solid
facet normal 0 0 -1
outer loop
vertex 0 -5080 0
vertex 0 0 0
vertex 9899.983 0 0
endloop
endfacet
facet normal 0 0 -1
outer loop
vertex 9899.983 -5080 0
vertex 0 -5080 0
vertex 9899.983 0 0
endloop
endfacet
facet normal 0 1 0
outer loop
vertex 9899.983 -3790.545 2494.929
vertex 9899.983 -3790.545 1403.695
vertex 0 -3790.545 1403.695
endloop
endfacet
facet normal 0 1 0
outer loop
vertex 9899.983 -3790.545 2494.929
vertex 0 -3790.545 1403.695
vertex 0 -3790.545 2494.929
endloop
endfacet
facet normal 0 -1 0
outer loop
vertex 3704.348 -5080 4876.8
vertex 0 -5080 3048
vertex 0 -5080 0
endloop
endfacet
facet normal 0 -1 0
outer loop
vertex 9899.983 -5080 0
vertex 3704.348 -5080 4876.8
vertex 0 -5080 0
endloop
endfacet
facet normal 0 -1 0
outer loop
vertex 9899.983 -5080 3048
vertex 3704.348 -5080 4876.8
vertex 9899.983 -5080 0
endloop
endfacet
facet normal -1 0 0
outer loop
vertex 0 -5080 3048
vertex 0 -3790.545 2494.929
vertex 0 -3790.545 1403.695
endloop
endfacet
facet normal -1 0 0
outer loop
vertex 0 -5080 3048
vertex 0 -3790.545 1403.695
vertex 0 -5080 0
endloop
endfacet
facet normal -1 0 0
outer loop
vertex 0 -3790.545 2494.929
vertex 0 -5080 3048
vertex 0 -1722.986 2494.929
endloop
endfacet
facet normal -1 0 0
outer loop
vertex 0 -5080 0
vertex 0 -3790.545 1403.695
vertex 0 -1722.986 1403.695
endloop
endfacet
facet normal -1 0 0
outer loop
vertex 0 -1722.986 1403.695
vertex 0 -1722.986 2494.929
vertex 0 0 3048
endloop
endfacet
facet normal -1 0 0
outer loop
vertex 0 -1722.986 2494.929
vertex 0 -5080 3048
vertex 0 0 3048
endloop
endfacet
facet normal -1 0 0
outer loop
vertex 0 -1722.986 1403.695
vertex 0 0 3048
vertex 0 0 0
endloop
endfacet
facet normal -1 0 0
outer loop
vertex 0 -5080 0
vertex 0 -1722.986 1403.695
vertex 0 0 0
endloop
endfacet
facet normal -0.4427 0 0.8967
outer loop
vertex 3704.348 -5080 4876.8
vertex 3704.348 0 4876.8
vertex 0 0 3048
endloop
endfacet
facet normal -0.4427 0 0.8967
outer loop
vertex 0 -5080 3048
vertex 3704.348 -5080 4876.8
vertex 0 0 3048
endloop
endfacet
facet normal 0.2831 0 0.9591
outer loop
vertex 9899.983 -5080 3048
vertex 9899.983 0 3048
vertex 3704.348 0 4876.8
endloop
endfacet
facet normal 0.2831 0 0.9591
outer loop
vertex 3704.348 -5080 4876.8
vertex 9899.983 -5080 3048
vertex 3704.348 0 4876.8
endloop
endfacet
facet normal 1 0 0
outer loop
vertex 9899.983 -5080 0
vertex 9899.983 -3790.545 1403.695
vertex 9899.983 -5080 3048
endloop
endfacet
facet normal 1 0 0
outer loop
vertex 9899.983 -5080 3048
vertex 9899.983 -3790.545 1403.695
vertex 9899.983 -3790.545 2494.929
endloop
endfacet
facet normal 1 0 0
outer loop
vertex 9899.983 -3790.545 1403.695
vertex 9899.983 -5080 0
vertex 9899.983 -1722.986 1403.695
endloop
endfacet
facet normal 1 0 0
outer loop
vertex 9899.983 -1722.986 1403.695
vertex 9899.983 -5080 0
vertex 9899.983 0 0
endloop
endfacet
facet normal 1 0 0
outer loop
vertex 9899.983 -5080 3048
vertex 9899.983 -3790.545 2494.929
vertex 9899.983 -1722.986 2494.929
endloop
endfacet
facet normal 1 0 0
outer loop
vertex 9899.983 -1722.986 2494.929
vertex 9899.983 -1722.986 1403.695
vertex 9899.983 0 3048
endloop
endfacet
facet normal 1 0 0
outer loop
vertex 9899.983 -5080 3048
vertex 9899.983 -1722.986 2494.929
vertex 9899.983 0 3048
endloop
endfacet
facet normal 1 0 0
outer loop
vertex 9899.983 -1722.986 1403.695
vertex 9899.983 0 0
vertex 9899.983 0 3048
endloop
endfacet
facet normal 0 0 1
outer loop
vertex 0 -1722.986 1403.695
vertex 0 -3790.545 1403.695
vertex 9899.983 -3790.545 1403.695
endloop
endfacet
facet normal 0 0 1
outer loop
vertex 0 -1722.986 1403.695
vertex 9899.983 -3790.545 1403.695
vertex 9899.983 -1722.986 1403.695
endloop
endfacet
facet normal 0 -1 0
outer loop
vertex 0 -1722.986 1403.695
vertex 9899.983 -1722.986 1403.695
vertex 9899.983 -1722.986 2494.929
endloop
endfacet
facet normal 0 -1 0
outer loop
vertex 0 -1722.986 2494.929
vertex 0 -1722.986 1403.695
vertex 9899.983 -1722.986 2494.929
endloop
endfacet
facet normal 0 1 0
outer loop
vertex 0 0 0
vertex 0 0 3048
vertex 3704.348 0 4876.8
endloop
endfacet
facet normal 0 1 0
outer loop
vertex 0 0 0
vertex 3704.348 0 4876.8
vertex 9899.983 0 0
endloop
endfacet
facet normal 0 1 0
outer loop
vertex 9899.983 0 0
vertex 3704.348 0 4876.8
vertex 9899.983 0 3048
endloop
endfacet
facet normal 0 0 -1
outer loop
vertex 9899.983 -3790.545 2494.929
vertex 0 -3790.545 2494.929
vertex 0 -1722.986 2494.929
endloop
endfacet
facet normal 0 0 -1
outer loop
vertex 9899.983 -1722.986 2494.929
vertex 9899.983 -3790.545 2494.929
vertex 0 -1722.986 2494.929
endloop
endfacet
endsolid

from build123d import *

# Parameters (mm, degrees)
F1_DEPTH = 5080
F2_W     = 2067.558765
F2_H     = 1091.233373
F3_DEPTH = 9899.983518


with BuildPart() as f1:
    # F0 (on Front) → F1 (new body)
    with BuildSketch(Plane.XZ):
        Polygon((0, 3048), (0, 0), (3670.44008, 0), (9899.982518, 0), (9899.982518, 3048), (3704.34847, 4876.8), align=None)
    extrude(amount=F1_DEPTH)

    # F2 (on face) → F3 (cut, through all)
    with BuildSketch(Plane.YZ.offset(9899.982518)):
        with Locations((-2756.765842, 1949.31215)):
            Rectangle(F2_W, F2_H)
    extrude(amount=-F3_DEPTH, mode=Mode.SUBTRACT)


solid = f1.part
